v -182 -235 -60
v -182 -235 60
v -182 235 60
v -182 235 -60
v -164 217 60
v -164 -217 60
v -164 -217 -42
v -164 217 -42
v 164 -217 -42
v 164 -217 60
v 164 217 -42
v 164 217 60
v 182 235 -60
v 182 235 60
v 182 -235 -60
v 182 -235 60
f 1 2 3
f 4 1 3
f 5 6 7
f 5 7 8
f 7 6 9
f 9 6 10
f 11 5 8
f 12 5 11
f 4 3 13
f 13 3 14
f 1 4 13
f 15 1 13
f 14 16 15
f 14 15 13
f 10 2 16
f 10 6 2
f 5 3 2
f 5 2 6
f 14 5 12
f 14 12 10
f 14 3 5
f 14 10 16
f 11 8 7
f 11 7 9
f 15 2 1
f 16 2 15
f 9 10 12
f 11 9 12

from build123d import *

# Parameters (mm, degrees)
F0_W     = 364
F0_H     = 470
F1_DEPTH = 60
F2_W     = 328
F2_H     = 434
F3_DEPTH = 102


with BuildPart() as f1:
    # F0 (on Top) → F1 (new body, symmetric)
    with BuildSketch(Plane.XY):
        Rectangle(F0_W, F0_H)
    extrude(amount=F1_DEPTH, both=True)

    # F2 (on face) → F3 (cut)
    with BuildSketch(Plane.XY.offset(60)):
        Rectangle(F2_W, F2_H)
    extrude(amount=-F3_DEPTH, mode=Mode.SUBTRACT)


solid = f1.part
